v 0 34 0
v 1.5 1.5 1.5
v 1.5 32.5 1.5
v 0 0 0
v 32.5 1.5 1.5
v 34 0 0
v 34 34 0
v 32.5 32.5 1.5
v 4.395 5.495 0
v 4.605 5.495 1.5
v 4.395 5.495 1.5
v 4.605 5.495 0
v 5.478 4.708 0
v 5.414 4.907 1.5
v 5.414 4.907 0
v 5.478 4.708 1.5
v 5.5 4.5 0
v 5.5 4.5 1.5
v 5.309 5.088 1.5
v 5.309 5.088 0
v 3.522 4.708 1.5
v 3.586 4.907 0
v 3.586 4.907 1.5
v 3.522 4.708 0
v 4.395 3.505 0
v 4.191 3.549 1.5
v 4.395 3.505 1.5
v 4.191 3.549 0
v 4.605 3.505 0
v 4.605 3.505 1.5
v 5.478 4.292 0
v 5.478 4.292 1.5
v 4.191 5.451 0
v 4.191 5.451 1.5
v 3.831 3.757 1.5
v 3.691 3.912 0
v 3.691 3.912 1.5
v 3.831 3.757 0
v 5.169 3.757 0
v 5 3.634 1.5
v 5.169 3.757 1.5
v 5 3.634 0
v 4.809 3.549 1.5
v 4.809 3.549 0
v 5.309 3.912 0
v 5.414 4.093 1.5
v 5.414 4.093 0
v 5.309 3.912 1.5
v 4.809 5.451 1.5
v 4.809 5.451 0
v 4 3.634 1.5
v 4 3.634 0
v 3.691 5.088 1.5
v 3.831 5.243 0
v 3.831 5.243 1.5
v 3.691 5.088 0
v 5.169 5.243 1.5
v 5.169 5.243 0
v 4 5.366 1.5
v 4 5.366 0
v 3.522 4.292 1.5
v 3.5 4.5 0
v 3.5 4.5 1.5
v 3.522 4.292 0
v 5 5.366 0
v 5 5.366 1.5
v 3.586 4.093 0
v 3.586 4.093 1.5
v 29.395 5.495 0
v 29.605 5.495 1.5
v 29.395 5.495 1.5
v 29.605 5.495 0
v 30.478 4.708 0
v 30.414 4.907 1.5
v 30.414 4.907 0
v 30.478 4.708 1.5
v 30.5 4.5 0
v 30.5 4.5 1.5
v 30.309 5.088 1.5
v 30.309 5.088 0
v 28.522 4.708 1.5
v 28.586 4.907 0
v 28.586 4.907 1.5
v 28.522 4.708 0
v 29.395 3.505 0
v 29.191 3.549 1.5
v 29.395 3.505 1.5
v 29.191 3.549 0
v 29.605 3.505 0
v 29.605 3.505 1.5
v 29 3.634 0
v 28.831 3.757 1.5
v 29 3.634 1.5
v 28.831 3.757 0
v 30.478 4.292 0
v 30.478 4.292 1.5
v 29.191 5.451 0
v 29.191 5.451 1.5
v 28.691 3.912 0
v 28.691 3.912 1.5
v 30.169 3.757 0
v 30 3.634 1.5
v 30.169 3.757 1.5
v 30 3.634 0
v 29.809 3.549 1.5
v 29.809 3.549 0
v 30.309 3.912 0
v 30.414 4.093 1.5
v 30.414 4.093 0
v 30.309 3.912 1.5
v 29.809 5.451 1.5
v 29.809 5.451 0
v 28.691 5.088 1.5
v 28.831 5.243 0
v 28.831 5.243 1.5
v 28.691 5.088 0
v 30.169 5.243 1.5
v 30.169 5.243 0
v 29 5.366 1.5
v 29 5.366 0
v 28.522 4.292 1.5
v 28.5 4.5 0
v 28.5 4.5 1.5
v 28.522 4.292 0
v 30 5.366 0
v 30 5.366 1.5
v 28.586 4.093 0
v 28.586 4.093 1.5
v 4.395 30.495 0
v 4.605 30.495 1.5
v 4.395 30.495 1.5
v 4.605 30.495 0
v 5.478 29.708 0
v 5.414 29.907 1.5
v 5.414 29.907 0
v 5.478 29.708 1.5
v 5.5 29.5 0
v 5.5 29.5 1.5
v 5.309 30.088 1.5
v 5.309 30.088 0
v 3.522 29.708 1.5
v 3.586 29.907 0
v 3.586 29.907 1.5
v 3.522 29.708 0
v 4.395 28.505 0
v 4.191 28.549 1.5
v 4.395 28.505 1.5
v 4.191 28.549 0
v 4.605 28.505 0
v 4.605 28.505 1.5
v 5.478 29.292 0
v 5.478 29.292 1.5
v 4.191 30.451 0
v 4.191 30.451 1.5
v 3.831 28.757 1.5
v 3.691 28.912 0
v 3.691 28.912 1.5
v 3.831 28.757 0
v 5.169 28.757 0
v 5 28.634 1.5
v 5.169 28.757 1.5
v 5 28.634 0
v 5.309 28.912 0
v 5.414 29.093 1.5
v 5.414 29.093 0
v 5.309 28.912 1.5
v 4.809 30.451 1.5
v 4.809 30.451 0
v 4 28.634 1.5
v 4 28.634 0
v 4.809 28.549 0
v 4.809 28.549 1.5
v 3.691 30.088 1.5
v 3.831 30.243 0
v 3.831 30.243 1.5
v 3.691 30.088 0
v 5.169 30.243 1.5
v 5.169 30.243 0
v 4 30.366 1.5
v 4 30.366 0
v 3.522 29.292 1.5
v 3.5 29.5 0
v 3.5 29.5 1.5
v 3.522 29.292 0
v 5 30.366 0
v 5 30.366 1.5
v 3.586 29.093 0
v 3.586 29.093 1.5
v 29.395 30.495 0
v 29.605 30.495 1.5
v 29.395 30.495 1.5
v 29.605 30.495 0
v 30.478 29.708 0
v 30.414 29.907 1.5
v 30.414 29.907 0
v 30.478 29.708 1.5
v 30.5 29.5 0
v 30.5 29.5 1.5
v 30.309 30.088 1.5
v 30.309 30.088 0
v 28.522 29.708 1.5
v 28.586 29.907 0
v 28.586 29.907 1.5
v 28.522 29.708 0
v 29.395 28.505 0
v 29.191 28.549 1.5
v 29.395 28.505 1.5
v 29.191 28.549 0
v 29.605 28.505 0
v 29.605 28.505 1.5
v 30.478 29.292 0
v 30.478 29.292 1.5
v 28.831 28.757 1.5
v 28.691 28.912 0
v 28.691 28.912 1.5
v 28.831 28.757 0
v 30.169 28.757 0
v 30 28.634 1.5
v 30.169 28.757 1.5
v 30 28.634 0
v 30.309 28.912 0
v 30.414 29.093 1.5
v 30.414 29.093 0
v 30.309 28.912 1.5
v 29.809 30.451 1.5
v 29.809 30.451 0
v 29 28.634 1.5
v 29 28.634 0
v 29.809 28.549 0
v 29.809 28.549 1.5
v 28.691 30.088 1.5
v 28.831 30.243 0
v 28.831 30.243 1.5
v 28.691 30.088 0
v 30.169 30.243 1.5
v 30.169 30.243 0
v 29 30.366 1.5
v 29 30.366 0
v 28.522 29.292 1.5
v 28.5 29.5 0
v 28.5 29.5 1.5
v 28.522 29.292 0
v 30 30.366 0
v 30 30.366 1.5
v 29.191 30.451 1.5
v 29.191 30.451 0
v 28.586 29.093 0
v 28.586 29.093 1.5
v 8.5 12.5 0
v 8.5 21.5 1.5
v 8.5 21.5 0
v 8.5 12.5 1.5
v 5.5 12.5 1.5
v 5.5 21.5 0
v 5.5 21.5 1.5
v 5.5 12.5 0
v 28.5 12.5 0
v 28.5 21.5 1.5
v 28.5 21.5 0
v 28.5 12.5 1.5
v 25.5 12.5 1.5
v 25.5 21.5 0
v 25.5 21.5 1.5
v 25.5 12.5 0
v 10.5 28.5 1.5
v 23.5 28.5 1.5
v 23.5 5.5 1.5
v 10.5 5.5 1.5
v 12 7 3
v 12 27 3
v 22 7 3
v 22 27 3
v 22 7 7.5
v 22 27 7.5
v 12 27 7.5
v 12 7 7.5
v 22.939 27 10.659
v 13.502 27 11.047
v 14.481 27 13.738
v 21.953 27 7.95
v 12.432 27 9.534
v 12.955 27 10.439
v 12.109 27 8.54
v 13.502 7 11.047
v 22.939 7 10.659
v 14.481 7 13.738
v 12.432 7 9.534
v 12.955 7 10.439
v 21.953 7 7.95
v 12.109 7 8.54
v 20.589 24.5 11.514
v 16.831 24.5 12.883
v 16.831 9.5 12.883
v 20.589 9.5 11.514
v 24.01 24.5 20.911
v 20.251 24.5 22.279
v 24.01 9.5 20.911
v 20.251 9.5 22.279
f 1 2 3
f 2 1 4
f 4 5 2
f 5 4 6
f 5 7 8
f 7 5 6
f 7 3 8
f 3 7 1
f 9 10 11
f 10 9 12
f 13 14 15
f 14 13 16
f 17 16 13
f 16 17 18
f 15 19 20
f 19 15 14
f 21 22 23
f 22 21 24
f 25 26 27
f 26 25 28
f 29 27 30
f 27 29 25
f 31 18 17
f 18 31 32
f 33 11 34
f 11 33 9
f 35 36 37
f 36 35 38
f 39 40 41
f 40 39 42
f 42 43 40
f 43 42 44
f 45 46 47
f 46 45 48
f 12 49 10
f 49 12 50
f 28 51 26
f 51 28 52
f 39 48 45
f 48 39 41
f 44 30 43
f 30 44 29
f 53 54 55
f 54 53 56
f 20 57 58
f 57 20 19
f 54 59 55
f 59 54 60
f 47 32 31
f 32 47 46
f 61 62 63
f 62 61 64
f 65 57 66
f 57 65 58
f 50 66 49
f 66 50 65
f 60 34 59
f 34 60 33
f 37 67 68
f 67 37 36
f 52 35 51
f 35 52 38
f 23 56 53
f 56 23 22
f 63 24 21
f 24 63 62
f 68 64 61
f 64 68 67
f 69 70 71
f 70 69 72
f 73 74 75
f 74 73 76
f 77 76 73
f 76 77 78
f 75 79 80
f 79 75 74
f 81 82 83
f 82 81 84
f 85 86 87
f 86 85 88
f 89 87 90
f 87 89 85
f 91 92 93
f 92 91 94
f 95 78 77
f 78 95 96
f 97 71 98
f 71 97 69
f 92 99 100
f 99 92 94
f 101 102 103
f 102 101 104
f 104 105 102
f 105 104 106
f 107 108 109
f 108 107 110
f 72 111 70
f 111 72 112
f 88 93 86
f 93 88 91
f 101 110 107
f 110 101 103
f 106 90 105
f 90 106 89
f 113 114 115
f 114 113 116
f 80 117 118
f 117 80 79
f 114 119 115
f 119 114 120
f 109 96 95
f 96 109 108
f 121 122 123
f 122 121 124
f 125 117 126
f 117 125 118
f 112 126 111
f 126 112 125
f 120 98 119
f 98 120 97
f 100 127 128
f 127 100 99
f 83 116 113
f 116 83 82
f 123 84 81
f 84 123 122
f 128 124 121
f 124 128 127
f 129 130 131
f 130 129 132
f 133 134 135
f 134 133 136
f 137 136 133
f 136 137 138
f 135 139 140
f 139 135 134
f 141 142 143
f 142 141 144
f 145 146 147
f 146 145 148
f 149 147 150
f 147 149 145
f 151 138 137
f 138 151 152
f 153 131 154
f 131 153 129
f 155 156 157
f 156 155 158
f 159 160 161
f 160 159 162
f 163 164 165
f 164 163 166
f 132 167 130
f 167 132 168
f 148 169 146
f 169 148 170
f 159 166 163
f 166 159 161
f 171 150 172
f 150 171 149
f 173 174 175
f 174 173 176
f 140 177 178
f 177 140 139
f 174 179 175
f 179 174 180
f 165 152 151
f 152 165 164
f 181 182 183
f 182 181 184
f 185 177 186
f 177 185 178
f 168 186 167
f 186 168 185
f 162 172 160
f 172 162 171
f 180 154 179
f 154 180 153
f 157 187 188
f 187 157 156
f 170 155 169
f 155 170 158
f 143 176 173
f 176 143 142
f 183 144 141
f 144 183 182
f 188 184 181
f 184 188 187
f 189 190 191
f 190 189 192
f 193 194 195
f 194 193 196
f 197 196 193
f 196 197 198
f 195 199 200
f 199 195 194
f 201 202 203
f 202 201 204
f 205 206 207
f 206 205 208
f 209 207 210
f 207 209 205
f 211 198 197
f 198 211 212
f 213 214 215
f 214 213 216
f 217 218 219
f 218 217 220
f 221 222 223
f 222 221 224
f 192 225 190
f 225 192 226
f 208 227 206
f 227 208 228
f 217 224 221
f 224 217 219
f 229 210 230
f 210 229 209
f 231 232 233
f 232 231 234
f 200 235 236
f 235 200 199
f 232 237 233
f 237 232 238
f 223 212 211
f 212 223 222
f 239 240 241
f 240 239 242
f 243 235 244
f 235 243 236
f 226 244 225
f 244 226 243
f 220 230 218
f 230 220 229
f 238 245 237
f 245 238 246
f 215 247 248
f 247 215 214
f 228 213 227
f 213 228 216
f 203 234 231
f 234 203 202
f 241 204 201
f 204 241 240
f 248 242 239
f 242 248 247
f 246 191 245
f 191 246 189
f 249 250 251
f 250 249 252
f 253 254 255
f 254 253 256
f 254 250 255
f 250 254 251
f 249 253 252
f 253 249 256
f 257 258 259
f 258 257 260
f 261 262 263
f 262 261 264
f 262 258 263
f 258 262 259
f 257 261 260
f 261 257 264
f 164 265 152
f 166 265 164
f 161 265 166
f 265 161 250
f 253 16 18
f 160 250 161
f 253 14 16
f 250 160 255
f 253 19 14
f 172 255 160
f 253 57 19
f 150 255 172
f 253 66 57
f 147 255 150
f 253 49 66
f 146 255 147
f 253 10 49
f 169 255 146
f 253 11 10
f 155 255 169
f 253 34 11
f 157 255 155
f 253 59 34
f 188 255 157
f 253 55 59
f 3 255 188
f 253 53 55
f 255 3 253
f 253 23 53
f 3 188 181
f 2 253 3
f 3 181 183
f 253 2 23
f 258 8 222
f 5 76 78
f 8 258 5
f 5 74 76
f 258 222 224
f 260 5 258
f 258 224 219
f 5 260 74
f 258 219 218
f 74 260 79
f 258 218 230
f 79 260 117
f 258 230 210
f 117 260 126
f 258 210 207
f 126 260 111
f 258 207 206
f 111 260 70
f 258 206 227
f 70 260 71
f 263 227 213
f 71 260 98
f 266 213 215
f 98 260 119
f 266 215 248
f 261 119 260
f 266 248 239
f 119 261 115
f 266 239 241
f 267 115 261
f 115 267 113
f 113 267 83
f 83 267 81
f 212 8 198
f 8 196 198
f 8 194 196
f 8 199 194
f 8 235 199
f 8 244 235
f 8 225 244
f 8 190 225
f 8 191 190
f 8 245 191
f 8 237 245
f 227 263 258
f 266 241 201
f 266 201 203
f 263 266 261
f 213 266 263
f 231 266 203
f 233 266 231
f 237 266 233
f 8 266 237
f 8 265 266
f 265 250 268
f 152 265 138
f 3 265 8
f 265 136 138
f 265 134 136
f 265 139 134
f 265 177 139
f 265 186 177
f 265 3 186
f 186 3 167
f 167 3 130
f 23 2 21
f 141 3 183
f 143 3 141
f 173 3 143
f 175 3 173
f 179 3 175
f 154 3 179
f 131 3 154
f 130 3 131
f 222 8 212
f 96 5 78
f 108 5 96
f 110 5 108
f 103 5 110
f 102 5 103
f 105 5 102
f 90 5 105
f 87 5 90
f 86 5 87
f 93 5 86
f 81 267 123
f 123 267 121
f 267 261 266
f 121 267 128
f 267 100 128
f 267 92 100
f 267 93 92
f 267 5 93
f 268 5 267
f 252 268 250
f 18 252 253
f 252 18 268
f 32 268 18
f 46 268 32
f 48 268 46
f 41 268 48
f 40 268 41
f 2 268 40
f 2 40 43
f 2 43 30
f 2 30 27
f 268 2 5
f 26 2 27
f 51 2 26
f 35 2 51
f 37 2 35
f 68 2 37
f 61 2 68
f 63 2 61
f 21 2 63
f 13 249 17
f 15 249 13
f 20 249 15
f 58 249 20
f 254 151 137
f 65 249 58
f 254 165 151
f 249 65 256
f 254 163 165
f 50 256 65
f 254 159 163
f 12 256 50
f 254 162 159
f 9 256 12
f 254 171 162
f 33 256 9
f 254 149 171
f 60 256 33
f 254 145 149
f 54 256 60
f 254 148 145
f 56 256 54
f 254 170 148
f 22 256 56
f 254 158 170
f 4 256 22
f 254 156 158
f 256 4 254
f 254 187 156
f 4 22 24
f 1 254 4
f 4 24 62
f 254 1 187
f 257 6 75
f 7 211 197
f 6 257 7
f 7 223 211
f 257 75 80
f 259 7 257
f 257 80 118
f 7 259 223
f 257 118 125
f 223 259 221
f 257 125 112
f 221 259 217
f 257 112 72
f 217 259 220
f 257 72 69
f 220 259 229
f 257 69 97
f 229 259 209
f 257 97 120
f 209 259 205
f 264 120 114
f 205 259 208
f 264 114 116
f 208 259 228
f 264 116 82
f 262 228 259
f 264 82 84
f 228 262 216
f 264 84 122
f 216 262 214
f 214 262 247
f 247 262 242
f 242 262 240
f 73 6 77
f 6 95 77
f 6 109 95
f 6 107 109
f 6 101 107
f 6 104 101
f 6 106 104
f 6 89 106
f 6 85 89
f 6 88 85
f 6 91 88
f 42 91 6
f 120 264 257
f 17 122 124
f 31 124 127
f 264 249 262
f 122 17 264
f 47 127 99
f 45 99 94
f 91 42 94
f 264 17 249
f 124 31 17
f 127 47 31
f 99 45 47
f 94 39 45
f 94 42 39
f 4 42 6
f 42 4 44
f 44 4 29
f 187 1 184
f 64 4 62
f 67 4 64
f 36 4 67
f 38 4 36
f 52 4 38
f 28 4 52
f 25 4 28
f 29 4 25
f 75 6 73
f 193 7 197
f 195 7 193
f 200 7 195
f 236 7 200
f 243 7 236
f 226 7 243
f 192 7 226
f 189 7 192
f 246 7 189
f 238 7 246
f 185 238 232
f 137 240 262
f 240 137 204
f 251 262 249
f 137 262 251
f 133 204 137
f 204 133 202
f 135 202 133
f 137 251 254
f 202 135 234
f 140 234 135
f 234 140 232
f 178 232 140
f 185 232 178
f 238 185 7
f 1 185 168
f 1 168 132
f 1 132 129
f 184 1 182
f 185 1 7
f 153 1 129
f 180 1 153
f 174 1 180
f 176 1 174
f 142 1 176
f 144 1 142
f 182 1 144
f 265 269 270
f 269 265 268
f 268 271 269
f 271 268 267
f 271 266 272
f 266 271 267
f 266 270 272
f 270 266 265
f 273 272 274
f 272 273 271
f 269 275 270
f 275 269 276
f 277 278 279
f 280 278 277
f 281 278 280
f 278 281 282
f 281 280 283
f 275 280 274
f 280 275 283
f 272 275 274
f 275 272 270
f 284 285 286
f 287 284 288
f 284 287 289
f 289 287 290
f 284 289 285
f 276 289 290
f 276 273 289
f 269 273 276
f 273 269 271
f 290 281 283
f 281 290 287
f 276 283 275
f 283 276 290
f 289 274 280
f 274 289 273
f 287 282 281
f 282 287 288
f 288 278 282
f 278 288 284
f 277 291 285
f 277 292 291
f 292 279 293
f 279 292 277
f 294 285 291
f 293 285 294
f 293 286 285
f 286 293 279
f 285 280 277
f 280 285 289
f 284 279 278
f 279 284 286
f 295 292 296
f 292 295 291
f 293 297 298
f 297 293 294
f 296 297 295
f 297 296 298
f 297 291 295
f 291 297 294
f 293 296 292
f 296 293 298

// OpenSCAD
// title      : RoboGen parametric B part
// author     : Alice Concordel

partB(20); //the parameter is the angle of the parametric part

module partB(alpha)
{
//plate parameters
	lengthSlide = 34;
	widthSlide = 34;
	heightSlide = 1.5;
	
	radiusHole = 1;

//wire hole parameters
	lengthWire = 3;
	widthWire = 9;
	heightWire = heightSlide;

//joint base parameters
	lengthBase = 10;
	widthBase = 20;
	heightBase = 6;
	
//cylinder parameters
	radiusCylinderBase = 5;
	heightCylinderBase = 20;
	
//rotating cube top part parameters
	lengthTop = 9;
	widthTop = 20;
	heightTop = 5;
	
	lengthEnd = 4;
	widthEnd = 15;
	heightEnd = 10;
	
	
	union()
	{
		difference()
		{
			// starting plate
			cube([lengthSlide,widthSlide,1.5]);
			
			union()
			{
			// chamfer the edges of the plate
				rotate ([0,-45,0]) cube([3,widthSlide,3]);
				rotate([45,0,0]) cube([lengthSlide,3,3]);
				translate([lengthSlide,0,0]) rotate([0,-45,0]) cube([3,widthSlide,3]);
				translate([0,widthSlide,0]) rotate([45,0,0]) cube([lengthSlide,3,3]);

			// holes in the plate
					//round holes
				translate([4.5,4.5,-0.5]) cylinder(r = radiusHole, h = heightSlide+1, $fn = 30);
				translate([lengthSlide-4.5,4.5,-0.5]) cylinder(r = radiusHole, h = heightSlide+1, $fn = 30);
				translate([4.5,widthSlide-4.5,-0.5]) cylinder(r = radiusHole, h = heightSlide+1, $fn = 30);
				translate([lengthSlide-4.5,widthSlide-4.5,-0.5]) cylinder(r = radiusHole, h = heightSlide+1, $fn = 30);
				
					//rectangular wire holes
				translate([7-lengthWire/2,widthSlide/2-widthWire/2,-0.5]) cube([lengthWire,widthWire,heightWire+1]);
				translate([lengthSlide-7-lengthWire/2,widthSlide/2-widthWire/2,-0.5]) cube([lengthWire,widthWire,heightWire+1]);
			}
		}
		// base of shaft part
		translate([lengthSlide/2-10/2,widthSlide/2-20/2,0]) cube([lengthBase,widthBase,heightBase+heightSlide]);
	
		//chamfer the edges of the shaft base
		difference()
		{
			translate([lengthSlide/2-(lengthBase+3)/2,widthSlide/2-(widthBase+3)/2]) cube([lengthBase+3,widthBase+3,3]);
			union()
			{
			translate([lengthSlide/2-lengthBase/2-heightSlide,0,heightSlide]) rotate ([0,-45,0]) cube([heightSlide*sqrt(2),34,heightSlide*sqrt(2)]);
			translate([0,widthSlide/2-widthBase/2-heightSlide,heightSlide]) rotate([45,0,0]) cube([lengthSlide,heightSlide*sqrt(2),heightSlide*sqrt(2)]);
			translate([lengthSlide/2+lengthBase/2+heightSlide,0,heightSlide]) rotate([0,-45,0]) cube([heightSlide*sqrt(2),34,heightSlide*sqrt(2)]);
			translate([0,widthSlide/2+widthBase/2+heightSlide,heightSlide]) rotate([45,0,0]) cube([lengthSlide,heightSlide*sqrt(2),heightSlide*sqrt(2)]);
			}
		}

		// cylinder or rounded part
		translate([lengthSlide/2,widthSlide/2-heightCylinderBase/2,heightBase+heightSlide]) rotate([-90,0,0]) cylinder(r = radiusCylinderBase, h = heightCylinderBase, $fn = 30);
		
		// next part of join = Box over one smaller Box
		//========================== angle parameter below
		translate([lengthSlide/2,widthSlide/2-widthTop/2,heightSlide+heightBase]) rotate([0,alpha,0]) translate([-lengthTop/2,0,0]) cube([lengthTop,widthTop,heightTop]);
		translate([lengthSlide/2,widthSlide/2-widthEnd/2,heightSlide+heightBase]) rotate([0,alpha,0]) translate([-lengthEnd/2,0,0]) cube([lengthEnd,widthEnd,heightEnd+heightTop]);
	}
}
